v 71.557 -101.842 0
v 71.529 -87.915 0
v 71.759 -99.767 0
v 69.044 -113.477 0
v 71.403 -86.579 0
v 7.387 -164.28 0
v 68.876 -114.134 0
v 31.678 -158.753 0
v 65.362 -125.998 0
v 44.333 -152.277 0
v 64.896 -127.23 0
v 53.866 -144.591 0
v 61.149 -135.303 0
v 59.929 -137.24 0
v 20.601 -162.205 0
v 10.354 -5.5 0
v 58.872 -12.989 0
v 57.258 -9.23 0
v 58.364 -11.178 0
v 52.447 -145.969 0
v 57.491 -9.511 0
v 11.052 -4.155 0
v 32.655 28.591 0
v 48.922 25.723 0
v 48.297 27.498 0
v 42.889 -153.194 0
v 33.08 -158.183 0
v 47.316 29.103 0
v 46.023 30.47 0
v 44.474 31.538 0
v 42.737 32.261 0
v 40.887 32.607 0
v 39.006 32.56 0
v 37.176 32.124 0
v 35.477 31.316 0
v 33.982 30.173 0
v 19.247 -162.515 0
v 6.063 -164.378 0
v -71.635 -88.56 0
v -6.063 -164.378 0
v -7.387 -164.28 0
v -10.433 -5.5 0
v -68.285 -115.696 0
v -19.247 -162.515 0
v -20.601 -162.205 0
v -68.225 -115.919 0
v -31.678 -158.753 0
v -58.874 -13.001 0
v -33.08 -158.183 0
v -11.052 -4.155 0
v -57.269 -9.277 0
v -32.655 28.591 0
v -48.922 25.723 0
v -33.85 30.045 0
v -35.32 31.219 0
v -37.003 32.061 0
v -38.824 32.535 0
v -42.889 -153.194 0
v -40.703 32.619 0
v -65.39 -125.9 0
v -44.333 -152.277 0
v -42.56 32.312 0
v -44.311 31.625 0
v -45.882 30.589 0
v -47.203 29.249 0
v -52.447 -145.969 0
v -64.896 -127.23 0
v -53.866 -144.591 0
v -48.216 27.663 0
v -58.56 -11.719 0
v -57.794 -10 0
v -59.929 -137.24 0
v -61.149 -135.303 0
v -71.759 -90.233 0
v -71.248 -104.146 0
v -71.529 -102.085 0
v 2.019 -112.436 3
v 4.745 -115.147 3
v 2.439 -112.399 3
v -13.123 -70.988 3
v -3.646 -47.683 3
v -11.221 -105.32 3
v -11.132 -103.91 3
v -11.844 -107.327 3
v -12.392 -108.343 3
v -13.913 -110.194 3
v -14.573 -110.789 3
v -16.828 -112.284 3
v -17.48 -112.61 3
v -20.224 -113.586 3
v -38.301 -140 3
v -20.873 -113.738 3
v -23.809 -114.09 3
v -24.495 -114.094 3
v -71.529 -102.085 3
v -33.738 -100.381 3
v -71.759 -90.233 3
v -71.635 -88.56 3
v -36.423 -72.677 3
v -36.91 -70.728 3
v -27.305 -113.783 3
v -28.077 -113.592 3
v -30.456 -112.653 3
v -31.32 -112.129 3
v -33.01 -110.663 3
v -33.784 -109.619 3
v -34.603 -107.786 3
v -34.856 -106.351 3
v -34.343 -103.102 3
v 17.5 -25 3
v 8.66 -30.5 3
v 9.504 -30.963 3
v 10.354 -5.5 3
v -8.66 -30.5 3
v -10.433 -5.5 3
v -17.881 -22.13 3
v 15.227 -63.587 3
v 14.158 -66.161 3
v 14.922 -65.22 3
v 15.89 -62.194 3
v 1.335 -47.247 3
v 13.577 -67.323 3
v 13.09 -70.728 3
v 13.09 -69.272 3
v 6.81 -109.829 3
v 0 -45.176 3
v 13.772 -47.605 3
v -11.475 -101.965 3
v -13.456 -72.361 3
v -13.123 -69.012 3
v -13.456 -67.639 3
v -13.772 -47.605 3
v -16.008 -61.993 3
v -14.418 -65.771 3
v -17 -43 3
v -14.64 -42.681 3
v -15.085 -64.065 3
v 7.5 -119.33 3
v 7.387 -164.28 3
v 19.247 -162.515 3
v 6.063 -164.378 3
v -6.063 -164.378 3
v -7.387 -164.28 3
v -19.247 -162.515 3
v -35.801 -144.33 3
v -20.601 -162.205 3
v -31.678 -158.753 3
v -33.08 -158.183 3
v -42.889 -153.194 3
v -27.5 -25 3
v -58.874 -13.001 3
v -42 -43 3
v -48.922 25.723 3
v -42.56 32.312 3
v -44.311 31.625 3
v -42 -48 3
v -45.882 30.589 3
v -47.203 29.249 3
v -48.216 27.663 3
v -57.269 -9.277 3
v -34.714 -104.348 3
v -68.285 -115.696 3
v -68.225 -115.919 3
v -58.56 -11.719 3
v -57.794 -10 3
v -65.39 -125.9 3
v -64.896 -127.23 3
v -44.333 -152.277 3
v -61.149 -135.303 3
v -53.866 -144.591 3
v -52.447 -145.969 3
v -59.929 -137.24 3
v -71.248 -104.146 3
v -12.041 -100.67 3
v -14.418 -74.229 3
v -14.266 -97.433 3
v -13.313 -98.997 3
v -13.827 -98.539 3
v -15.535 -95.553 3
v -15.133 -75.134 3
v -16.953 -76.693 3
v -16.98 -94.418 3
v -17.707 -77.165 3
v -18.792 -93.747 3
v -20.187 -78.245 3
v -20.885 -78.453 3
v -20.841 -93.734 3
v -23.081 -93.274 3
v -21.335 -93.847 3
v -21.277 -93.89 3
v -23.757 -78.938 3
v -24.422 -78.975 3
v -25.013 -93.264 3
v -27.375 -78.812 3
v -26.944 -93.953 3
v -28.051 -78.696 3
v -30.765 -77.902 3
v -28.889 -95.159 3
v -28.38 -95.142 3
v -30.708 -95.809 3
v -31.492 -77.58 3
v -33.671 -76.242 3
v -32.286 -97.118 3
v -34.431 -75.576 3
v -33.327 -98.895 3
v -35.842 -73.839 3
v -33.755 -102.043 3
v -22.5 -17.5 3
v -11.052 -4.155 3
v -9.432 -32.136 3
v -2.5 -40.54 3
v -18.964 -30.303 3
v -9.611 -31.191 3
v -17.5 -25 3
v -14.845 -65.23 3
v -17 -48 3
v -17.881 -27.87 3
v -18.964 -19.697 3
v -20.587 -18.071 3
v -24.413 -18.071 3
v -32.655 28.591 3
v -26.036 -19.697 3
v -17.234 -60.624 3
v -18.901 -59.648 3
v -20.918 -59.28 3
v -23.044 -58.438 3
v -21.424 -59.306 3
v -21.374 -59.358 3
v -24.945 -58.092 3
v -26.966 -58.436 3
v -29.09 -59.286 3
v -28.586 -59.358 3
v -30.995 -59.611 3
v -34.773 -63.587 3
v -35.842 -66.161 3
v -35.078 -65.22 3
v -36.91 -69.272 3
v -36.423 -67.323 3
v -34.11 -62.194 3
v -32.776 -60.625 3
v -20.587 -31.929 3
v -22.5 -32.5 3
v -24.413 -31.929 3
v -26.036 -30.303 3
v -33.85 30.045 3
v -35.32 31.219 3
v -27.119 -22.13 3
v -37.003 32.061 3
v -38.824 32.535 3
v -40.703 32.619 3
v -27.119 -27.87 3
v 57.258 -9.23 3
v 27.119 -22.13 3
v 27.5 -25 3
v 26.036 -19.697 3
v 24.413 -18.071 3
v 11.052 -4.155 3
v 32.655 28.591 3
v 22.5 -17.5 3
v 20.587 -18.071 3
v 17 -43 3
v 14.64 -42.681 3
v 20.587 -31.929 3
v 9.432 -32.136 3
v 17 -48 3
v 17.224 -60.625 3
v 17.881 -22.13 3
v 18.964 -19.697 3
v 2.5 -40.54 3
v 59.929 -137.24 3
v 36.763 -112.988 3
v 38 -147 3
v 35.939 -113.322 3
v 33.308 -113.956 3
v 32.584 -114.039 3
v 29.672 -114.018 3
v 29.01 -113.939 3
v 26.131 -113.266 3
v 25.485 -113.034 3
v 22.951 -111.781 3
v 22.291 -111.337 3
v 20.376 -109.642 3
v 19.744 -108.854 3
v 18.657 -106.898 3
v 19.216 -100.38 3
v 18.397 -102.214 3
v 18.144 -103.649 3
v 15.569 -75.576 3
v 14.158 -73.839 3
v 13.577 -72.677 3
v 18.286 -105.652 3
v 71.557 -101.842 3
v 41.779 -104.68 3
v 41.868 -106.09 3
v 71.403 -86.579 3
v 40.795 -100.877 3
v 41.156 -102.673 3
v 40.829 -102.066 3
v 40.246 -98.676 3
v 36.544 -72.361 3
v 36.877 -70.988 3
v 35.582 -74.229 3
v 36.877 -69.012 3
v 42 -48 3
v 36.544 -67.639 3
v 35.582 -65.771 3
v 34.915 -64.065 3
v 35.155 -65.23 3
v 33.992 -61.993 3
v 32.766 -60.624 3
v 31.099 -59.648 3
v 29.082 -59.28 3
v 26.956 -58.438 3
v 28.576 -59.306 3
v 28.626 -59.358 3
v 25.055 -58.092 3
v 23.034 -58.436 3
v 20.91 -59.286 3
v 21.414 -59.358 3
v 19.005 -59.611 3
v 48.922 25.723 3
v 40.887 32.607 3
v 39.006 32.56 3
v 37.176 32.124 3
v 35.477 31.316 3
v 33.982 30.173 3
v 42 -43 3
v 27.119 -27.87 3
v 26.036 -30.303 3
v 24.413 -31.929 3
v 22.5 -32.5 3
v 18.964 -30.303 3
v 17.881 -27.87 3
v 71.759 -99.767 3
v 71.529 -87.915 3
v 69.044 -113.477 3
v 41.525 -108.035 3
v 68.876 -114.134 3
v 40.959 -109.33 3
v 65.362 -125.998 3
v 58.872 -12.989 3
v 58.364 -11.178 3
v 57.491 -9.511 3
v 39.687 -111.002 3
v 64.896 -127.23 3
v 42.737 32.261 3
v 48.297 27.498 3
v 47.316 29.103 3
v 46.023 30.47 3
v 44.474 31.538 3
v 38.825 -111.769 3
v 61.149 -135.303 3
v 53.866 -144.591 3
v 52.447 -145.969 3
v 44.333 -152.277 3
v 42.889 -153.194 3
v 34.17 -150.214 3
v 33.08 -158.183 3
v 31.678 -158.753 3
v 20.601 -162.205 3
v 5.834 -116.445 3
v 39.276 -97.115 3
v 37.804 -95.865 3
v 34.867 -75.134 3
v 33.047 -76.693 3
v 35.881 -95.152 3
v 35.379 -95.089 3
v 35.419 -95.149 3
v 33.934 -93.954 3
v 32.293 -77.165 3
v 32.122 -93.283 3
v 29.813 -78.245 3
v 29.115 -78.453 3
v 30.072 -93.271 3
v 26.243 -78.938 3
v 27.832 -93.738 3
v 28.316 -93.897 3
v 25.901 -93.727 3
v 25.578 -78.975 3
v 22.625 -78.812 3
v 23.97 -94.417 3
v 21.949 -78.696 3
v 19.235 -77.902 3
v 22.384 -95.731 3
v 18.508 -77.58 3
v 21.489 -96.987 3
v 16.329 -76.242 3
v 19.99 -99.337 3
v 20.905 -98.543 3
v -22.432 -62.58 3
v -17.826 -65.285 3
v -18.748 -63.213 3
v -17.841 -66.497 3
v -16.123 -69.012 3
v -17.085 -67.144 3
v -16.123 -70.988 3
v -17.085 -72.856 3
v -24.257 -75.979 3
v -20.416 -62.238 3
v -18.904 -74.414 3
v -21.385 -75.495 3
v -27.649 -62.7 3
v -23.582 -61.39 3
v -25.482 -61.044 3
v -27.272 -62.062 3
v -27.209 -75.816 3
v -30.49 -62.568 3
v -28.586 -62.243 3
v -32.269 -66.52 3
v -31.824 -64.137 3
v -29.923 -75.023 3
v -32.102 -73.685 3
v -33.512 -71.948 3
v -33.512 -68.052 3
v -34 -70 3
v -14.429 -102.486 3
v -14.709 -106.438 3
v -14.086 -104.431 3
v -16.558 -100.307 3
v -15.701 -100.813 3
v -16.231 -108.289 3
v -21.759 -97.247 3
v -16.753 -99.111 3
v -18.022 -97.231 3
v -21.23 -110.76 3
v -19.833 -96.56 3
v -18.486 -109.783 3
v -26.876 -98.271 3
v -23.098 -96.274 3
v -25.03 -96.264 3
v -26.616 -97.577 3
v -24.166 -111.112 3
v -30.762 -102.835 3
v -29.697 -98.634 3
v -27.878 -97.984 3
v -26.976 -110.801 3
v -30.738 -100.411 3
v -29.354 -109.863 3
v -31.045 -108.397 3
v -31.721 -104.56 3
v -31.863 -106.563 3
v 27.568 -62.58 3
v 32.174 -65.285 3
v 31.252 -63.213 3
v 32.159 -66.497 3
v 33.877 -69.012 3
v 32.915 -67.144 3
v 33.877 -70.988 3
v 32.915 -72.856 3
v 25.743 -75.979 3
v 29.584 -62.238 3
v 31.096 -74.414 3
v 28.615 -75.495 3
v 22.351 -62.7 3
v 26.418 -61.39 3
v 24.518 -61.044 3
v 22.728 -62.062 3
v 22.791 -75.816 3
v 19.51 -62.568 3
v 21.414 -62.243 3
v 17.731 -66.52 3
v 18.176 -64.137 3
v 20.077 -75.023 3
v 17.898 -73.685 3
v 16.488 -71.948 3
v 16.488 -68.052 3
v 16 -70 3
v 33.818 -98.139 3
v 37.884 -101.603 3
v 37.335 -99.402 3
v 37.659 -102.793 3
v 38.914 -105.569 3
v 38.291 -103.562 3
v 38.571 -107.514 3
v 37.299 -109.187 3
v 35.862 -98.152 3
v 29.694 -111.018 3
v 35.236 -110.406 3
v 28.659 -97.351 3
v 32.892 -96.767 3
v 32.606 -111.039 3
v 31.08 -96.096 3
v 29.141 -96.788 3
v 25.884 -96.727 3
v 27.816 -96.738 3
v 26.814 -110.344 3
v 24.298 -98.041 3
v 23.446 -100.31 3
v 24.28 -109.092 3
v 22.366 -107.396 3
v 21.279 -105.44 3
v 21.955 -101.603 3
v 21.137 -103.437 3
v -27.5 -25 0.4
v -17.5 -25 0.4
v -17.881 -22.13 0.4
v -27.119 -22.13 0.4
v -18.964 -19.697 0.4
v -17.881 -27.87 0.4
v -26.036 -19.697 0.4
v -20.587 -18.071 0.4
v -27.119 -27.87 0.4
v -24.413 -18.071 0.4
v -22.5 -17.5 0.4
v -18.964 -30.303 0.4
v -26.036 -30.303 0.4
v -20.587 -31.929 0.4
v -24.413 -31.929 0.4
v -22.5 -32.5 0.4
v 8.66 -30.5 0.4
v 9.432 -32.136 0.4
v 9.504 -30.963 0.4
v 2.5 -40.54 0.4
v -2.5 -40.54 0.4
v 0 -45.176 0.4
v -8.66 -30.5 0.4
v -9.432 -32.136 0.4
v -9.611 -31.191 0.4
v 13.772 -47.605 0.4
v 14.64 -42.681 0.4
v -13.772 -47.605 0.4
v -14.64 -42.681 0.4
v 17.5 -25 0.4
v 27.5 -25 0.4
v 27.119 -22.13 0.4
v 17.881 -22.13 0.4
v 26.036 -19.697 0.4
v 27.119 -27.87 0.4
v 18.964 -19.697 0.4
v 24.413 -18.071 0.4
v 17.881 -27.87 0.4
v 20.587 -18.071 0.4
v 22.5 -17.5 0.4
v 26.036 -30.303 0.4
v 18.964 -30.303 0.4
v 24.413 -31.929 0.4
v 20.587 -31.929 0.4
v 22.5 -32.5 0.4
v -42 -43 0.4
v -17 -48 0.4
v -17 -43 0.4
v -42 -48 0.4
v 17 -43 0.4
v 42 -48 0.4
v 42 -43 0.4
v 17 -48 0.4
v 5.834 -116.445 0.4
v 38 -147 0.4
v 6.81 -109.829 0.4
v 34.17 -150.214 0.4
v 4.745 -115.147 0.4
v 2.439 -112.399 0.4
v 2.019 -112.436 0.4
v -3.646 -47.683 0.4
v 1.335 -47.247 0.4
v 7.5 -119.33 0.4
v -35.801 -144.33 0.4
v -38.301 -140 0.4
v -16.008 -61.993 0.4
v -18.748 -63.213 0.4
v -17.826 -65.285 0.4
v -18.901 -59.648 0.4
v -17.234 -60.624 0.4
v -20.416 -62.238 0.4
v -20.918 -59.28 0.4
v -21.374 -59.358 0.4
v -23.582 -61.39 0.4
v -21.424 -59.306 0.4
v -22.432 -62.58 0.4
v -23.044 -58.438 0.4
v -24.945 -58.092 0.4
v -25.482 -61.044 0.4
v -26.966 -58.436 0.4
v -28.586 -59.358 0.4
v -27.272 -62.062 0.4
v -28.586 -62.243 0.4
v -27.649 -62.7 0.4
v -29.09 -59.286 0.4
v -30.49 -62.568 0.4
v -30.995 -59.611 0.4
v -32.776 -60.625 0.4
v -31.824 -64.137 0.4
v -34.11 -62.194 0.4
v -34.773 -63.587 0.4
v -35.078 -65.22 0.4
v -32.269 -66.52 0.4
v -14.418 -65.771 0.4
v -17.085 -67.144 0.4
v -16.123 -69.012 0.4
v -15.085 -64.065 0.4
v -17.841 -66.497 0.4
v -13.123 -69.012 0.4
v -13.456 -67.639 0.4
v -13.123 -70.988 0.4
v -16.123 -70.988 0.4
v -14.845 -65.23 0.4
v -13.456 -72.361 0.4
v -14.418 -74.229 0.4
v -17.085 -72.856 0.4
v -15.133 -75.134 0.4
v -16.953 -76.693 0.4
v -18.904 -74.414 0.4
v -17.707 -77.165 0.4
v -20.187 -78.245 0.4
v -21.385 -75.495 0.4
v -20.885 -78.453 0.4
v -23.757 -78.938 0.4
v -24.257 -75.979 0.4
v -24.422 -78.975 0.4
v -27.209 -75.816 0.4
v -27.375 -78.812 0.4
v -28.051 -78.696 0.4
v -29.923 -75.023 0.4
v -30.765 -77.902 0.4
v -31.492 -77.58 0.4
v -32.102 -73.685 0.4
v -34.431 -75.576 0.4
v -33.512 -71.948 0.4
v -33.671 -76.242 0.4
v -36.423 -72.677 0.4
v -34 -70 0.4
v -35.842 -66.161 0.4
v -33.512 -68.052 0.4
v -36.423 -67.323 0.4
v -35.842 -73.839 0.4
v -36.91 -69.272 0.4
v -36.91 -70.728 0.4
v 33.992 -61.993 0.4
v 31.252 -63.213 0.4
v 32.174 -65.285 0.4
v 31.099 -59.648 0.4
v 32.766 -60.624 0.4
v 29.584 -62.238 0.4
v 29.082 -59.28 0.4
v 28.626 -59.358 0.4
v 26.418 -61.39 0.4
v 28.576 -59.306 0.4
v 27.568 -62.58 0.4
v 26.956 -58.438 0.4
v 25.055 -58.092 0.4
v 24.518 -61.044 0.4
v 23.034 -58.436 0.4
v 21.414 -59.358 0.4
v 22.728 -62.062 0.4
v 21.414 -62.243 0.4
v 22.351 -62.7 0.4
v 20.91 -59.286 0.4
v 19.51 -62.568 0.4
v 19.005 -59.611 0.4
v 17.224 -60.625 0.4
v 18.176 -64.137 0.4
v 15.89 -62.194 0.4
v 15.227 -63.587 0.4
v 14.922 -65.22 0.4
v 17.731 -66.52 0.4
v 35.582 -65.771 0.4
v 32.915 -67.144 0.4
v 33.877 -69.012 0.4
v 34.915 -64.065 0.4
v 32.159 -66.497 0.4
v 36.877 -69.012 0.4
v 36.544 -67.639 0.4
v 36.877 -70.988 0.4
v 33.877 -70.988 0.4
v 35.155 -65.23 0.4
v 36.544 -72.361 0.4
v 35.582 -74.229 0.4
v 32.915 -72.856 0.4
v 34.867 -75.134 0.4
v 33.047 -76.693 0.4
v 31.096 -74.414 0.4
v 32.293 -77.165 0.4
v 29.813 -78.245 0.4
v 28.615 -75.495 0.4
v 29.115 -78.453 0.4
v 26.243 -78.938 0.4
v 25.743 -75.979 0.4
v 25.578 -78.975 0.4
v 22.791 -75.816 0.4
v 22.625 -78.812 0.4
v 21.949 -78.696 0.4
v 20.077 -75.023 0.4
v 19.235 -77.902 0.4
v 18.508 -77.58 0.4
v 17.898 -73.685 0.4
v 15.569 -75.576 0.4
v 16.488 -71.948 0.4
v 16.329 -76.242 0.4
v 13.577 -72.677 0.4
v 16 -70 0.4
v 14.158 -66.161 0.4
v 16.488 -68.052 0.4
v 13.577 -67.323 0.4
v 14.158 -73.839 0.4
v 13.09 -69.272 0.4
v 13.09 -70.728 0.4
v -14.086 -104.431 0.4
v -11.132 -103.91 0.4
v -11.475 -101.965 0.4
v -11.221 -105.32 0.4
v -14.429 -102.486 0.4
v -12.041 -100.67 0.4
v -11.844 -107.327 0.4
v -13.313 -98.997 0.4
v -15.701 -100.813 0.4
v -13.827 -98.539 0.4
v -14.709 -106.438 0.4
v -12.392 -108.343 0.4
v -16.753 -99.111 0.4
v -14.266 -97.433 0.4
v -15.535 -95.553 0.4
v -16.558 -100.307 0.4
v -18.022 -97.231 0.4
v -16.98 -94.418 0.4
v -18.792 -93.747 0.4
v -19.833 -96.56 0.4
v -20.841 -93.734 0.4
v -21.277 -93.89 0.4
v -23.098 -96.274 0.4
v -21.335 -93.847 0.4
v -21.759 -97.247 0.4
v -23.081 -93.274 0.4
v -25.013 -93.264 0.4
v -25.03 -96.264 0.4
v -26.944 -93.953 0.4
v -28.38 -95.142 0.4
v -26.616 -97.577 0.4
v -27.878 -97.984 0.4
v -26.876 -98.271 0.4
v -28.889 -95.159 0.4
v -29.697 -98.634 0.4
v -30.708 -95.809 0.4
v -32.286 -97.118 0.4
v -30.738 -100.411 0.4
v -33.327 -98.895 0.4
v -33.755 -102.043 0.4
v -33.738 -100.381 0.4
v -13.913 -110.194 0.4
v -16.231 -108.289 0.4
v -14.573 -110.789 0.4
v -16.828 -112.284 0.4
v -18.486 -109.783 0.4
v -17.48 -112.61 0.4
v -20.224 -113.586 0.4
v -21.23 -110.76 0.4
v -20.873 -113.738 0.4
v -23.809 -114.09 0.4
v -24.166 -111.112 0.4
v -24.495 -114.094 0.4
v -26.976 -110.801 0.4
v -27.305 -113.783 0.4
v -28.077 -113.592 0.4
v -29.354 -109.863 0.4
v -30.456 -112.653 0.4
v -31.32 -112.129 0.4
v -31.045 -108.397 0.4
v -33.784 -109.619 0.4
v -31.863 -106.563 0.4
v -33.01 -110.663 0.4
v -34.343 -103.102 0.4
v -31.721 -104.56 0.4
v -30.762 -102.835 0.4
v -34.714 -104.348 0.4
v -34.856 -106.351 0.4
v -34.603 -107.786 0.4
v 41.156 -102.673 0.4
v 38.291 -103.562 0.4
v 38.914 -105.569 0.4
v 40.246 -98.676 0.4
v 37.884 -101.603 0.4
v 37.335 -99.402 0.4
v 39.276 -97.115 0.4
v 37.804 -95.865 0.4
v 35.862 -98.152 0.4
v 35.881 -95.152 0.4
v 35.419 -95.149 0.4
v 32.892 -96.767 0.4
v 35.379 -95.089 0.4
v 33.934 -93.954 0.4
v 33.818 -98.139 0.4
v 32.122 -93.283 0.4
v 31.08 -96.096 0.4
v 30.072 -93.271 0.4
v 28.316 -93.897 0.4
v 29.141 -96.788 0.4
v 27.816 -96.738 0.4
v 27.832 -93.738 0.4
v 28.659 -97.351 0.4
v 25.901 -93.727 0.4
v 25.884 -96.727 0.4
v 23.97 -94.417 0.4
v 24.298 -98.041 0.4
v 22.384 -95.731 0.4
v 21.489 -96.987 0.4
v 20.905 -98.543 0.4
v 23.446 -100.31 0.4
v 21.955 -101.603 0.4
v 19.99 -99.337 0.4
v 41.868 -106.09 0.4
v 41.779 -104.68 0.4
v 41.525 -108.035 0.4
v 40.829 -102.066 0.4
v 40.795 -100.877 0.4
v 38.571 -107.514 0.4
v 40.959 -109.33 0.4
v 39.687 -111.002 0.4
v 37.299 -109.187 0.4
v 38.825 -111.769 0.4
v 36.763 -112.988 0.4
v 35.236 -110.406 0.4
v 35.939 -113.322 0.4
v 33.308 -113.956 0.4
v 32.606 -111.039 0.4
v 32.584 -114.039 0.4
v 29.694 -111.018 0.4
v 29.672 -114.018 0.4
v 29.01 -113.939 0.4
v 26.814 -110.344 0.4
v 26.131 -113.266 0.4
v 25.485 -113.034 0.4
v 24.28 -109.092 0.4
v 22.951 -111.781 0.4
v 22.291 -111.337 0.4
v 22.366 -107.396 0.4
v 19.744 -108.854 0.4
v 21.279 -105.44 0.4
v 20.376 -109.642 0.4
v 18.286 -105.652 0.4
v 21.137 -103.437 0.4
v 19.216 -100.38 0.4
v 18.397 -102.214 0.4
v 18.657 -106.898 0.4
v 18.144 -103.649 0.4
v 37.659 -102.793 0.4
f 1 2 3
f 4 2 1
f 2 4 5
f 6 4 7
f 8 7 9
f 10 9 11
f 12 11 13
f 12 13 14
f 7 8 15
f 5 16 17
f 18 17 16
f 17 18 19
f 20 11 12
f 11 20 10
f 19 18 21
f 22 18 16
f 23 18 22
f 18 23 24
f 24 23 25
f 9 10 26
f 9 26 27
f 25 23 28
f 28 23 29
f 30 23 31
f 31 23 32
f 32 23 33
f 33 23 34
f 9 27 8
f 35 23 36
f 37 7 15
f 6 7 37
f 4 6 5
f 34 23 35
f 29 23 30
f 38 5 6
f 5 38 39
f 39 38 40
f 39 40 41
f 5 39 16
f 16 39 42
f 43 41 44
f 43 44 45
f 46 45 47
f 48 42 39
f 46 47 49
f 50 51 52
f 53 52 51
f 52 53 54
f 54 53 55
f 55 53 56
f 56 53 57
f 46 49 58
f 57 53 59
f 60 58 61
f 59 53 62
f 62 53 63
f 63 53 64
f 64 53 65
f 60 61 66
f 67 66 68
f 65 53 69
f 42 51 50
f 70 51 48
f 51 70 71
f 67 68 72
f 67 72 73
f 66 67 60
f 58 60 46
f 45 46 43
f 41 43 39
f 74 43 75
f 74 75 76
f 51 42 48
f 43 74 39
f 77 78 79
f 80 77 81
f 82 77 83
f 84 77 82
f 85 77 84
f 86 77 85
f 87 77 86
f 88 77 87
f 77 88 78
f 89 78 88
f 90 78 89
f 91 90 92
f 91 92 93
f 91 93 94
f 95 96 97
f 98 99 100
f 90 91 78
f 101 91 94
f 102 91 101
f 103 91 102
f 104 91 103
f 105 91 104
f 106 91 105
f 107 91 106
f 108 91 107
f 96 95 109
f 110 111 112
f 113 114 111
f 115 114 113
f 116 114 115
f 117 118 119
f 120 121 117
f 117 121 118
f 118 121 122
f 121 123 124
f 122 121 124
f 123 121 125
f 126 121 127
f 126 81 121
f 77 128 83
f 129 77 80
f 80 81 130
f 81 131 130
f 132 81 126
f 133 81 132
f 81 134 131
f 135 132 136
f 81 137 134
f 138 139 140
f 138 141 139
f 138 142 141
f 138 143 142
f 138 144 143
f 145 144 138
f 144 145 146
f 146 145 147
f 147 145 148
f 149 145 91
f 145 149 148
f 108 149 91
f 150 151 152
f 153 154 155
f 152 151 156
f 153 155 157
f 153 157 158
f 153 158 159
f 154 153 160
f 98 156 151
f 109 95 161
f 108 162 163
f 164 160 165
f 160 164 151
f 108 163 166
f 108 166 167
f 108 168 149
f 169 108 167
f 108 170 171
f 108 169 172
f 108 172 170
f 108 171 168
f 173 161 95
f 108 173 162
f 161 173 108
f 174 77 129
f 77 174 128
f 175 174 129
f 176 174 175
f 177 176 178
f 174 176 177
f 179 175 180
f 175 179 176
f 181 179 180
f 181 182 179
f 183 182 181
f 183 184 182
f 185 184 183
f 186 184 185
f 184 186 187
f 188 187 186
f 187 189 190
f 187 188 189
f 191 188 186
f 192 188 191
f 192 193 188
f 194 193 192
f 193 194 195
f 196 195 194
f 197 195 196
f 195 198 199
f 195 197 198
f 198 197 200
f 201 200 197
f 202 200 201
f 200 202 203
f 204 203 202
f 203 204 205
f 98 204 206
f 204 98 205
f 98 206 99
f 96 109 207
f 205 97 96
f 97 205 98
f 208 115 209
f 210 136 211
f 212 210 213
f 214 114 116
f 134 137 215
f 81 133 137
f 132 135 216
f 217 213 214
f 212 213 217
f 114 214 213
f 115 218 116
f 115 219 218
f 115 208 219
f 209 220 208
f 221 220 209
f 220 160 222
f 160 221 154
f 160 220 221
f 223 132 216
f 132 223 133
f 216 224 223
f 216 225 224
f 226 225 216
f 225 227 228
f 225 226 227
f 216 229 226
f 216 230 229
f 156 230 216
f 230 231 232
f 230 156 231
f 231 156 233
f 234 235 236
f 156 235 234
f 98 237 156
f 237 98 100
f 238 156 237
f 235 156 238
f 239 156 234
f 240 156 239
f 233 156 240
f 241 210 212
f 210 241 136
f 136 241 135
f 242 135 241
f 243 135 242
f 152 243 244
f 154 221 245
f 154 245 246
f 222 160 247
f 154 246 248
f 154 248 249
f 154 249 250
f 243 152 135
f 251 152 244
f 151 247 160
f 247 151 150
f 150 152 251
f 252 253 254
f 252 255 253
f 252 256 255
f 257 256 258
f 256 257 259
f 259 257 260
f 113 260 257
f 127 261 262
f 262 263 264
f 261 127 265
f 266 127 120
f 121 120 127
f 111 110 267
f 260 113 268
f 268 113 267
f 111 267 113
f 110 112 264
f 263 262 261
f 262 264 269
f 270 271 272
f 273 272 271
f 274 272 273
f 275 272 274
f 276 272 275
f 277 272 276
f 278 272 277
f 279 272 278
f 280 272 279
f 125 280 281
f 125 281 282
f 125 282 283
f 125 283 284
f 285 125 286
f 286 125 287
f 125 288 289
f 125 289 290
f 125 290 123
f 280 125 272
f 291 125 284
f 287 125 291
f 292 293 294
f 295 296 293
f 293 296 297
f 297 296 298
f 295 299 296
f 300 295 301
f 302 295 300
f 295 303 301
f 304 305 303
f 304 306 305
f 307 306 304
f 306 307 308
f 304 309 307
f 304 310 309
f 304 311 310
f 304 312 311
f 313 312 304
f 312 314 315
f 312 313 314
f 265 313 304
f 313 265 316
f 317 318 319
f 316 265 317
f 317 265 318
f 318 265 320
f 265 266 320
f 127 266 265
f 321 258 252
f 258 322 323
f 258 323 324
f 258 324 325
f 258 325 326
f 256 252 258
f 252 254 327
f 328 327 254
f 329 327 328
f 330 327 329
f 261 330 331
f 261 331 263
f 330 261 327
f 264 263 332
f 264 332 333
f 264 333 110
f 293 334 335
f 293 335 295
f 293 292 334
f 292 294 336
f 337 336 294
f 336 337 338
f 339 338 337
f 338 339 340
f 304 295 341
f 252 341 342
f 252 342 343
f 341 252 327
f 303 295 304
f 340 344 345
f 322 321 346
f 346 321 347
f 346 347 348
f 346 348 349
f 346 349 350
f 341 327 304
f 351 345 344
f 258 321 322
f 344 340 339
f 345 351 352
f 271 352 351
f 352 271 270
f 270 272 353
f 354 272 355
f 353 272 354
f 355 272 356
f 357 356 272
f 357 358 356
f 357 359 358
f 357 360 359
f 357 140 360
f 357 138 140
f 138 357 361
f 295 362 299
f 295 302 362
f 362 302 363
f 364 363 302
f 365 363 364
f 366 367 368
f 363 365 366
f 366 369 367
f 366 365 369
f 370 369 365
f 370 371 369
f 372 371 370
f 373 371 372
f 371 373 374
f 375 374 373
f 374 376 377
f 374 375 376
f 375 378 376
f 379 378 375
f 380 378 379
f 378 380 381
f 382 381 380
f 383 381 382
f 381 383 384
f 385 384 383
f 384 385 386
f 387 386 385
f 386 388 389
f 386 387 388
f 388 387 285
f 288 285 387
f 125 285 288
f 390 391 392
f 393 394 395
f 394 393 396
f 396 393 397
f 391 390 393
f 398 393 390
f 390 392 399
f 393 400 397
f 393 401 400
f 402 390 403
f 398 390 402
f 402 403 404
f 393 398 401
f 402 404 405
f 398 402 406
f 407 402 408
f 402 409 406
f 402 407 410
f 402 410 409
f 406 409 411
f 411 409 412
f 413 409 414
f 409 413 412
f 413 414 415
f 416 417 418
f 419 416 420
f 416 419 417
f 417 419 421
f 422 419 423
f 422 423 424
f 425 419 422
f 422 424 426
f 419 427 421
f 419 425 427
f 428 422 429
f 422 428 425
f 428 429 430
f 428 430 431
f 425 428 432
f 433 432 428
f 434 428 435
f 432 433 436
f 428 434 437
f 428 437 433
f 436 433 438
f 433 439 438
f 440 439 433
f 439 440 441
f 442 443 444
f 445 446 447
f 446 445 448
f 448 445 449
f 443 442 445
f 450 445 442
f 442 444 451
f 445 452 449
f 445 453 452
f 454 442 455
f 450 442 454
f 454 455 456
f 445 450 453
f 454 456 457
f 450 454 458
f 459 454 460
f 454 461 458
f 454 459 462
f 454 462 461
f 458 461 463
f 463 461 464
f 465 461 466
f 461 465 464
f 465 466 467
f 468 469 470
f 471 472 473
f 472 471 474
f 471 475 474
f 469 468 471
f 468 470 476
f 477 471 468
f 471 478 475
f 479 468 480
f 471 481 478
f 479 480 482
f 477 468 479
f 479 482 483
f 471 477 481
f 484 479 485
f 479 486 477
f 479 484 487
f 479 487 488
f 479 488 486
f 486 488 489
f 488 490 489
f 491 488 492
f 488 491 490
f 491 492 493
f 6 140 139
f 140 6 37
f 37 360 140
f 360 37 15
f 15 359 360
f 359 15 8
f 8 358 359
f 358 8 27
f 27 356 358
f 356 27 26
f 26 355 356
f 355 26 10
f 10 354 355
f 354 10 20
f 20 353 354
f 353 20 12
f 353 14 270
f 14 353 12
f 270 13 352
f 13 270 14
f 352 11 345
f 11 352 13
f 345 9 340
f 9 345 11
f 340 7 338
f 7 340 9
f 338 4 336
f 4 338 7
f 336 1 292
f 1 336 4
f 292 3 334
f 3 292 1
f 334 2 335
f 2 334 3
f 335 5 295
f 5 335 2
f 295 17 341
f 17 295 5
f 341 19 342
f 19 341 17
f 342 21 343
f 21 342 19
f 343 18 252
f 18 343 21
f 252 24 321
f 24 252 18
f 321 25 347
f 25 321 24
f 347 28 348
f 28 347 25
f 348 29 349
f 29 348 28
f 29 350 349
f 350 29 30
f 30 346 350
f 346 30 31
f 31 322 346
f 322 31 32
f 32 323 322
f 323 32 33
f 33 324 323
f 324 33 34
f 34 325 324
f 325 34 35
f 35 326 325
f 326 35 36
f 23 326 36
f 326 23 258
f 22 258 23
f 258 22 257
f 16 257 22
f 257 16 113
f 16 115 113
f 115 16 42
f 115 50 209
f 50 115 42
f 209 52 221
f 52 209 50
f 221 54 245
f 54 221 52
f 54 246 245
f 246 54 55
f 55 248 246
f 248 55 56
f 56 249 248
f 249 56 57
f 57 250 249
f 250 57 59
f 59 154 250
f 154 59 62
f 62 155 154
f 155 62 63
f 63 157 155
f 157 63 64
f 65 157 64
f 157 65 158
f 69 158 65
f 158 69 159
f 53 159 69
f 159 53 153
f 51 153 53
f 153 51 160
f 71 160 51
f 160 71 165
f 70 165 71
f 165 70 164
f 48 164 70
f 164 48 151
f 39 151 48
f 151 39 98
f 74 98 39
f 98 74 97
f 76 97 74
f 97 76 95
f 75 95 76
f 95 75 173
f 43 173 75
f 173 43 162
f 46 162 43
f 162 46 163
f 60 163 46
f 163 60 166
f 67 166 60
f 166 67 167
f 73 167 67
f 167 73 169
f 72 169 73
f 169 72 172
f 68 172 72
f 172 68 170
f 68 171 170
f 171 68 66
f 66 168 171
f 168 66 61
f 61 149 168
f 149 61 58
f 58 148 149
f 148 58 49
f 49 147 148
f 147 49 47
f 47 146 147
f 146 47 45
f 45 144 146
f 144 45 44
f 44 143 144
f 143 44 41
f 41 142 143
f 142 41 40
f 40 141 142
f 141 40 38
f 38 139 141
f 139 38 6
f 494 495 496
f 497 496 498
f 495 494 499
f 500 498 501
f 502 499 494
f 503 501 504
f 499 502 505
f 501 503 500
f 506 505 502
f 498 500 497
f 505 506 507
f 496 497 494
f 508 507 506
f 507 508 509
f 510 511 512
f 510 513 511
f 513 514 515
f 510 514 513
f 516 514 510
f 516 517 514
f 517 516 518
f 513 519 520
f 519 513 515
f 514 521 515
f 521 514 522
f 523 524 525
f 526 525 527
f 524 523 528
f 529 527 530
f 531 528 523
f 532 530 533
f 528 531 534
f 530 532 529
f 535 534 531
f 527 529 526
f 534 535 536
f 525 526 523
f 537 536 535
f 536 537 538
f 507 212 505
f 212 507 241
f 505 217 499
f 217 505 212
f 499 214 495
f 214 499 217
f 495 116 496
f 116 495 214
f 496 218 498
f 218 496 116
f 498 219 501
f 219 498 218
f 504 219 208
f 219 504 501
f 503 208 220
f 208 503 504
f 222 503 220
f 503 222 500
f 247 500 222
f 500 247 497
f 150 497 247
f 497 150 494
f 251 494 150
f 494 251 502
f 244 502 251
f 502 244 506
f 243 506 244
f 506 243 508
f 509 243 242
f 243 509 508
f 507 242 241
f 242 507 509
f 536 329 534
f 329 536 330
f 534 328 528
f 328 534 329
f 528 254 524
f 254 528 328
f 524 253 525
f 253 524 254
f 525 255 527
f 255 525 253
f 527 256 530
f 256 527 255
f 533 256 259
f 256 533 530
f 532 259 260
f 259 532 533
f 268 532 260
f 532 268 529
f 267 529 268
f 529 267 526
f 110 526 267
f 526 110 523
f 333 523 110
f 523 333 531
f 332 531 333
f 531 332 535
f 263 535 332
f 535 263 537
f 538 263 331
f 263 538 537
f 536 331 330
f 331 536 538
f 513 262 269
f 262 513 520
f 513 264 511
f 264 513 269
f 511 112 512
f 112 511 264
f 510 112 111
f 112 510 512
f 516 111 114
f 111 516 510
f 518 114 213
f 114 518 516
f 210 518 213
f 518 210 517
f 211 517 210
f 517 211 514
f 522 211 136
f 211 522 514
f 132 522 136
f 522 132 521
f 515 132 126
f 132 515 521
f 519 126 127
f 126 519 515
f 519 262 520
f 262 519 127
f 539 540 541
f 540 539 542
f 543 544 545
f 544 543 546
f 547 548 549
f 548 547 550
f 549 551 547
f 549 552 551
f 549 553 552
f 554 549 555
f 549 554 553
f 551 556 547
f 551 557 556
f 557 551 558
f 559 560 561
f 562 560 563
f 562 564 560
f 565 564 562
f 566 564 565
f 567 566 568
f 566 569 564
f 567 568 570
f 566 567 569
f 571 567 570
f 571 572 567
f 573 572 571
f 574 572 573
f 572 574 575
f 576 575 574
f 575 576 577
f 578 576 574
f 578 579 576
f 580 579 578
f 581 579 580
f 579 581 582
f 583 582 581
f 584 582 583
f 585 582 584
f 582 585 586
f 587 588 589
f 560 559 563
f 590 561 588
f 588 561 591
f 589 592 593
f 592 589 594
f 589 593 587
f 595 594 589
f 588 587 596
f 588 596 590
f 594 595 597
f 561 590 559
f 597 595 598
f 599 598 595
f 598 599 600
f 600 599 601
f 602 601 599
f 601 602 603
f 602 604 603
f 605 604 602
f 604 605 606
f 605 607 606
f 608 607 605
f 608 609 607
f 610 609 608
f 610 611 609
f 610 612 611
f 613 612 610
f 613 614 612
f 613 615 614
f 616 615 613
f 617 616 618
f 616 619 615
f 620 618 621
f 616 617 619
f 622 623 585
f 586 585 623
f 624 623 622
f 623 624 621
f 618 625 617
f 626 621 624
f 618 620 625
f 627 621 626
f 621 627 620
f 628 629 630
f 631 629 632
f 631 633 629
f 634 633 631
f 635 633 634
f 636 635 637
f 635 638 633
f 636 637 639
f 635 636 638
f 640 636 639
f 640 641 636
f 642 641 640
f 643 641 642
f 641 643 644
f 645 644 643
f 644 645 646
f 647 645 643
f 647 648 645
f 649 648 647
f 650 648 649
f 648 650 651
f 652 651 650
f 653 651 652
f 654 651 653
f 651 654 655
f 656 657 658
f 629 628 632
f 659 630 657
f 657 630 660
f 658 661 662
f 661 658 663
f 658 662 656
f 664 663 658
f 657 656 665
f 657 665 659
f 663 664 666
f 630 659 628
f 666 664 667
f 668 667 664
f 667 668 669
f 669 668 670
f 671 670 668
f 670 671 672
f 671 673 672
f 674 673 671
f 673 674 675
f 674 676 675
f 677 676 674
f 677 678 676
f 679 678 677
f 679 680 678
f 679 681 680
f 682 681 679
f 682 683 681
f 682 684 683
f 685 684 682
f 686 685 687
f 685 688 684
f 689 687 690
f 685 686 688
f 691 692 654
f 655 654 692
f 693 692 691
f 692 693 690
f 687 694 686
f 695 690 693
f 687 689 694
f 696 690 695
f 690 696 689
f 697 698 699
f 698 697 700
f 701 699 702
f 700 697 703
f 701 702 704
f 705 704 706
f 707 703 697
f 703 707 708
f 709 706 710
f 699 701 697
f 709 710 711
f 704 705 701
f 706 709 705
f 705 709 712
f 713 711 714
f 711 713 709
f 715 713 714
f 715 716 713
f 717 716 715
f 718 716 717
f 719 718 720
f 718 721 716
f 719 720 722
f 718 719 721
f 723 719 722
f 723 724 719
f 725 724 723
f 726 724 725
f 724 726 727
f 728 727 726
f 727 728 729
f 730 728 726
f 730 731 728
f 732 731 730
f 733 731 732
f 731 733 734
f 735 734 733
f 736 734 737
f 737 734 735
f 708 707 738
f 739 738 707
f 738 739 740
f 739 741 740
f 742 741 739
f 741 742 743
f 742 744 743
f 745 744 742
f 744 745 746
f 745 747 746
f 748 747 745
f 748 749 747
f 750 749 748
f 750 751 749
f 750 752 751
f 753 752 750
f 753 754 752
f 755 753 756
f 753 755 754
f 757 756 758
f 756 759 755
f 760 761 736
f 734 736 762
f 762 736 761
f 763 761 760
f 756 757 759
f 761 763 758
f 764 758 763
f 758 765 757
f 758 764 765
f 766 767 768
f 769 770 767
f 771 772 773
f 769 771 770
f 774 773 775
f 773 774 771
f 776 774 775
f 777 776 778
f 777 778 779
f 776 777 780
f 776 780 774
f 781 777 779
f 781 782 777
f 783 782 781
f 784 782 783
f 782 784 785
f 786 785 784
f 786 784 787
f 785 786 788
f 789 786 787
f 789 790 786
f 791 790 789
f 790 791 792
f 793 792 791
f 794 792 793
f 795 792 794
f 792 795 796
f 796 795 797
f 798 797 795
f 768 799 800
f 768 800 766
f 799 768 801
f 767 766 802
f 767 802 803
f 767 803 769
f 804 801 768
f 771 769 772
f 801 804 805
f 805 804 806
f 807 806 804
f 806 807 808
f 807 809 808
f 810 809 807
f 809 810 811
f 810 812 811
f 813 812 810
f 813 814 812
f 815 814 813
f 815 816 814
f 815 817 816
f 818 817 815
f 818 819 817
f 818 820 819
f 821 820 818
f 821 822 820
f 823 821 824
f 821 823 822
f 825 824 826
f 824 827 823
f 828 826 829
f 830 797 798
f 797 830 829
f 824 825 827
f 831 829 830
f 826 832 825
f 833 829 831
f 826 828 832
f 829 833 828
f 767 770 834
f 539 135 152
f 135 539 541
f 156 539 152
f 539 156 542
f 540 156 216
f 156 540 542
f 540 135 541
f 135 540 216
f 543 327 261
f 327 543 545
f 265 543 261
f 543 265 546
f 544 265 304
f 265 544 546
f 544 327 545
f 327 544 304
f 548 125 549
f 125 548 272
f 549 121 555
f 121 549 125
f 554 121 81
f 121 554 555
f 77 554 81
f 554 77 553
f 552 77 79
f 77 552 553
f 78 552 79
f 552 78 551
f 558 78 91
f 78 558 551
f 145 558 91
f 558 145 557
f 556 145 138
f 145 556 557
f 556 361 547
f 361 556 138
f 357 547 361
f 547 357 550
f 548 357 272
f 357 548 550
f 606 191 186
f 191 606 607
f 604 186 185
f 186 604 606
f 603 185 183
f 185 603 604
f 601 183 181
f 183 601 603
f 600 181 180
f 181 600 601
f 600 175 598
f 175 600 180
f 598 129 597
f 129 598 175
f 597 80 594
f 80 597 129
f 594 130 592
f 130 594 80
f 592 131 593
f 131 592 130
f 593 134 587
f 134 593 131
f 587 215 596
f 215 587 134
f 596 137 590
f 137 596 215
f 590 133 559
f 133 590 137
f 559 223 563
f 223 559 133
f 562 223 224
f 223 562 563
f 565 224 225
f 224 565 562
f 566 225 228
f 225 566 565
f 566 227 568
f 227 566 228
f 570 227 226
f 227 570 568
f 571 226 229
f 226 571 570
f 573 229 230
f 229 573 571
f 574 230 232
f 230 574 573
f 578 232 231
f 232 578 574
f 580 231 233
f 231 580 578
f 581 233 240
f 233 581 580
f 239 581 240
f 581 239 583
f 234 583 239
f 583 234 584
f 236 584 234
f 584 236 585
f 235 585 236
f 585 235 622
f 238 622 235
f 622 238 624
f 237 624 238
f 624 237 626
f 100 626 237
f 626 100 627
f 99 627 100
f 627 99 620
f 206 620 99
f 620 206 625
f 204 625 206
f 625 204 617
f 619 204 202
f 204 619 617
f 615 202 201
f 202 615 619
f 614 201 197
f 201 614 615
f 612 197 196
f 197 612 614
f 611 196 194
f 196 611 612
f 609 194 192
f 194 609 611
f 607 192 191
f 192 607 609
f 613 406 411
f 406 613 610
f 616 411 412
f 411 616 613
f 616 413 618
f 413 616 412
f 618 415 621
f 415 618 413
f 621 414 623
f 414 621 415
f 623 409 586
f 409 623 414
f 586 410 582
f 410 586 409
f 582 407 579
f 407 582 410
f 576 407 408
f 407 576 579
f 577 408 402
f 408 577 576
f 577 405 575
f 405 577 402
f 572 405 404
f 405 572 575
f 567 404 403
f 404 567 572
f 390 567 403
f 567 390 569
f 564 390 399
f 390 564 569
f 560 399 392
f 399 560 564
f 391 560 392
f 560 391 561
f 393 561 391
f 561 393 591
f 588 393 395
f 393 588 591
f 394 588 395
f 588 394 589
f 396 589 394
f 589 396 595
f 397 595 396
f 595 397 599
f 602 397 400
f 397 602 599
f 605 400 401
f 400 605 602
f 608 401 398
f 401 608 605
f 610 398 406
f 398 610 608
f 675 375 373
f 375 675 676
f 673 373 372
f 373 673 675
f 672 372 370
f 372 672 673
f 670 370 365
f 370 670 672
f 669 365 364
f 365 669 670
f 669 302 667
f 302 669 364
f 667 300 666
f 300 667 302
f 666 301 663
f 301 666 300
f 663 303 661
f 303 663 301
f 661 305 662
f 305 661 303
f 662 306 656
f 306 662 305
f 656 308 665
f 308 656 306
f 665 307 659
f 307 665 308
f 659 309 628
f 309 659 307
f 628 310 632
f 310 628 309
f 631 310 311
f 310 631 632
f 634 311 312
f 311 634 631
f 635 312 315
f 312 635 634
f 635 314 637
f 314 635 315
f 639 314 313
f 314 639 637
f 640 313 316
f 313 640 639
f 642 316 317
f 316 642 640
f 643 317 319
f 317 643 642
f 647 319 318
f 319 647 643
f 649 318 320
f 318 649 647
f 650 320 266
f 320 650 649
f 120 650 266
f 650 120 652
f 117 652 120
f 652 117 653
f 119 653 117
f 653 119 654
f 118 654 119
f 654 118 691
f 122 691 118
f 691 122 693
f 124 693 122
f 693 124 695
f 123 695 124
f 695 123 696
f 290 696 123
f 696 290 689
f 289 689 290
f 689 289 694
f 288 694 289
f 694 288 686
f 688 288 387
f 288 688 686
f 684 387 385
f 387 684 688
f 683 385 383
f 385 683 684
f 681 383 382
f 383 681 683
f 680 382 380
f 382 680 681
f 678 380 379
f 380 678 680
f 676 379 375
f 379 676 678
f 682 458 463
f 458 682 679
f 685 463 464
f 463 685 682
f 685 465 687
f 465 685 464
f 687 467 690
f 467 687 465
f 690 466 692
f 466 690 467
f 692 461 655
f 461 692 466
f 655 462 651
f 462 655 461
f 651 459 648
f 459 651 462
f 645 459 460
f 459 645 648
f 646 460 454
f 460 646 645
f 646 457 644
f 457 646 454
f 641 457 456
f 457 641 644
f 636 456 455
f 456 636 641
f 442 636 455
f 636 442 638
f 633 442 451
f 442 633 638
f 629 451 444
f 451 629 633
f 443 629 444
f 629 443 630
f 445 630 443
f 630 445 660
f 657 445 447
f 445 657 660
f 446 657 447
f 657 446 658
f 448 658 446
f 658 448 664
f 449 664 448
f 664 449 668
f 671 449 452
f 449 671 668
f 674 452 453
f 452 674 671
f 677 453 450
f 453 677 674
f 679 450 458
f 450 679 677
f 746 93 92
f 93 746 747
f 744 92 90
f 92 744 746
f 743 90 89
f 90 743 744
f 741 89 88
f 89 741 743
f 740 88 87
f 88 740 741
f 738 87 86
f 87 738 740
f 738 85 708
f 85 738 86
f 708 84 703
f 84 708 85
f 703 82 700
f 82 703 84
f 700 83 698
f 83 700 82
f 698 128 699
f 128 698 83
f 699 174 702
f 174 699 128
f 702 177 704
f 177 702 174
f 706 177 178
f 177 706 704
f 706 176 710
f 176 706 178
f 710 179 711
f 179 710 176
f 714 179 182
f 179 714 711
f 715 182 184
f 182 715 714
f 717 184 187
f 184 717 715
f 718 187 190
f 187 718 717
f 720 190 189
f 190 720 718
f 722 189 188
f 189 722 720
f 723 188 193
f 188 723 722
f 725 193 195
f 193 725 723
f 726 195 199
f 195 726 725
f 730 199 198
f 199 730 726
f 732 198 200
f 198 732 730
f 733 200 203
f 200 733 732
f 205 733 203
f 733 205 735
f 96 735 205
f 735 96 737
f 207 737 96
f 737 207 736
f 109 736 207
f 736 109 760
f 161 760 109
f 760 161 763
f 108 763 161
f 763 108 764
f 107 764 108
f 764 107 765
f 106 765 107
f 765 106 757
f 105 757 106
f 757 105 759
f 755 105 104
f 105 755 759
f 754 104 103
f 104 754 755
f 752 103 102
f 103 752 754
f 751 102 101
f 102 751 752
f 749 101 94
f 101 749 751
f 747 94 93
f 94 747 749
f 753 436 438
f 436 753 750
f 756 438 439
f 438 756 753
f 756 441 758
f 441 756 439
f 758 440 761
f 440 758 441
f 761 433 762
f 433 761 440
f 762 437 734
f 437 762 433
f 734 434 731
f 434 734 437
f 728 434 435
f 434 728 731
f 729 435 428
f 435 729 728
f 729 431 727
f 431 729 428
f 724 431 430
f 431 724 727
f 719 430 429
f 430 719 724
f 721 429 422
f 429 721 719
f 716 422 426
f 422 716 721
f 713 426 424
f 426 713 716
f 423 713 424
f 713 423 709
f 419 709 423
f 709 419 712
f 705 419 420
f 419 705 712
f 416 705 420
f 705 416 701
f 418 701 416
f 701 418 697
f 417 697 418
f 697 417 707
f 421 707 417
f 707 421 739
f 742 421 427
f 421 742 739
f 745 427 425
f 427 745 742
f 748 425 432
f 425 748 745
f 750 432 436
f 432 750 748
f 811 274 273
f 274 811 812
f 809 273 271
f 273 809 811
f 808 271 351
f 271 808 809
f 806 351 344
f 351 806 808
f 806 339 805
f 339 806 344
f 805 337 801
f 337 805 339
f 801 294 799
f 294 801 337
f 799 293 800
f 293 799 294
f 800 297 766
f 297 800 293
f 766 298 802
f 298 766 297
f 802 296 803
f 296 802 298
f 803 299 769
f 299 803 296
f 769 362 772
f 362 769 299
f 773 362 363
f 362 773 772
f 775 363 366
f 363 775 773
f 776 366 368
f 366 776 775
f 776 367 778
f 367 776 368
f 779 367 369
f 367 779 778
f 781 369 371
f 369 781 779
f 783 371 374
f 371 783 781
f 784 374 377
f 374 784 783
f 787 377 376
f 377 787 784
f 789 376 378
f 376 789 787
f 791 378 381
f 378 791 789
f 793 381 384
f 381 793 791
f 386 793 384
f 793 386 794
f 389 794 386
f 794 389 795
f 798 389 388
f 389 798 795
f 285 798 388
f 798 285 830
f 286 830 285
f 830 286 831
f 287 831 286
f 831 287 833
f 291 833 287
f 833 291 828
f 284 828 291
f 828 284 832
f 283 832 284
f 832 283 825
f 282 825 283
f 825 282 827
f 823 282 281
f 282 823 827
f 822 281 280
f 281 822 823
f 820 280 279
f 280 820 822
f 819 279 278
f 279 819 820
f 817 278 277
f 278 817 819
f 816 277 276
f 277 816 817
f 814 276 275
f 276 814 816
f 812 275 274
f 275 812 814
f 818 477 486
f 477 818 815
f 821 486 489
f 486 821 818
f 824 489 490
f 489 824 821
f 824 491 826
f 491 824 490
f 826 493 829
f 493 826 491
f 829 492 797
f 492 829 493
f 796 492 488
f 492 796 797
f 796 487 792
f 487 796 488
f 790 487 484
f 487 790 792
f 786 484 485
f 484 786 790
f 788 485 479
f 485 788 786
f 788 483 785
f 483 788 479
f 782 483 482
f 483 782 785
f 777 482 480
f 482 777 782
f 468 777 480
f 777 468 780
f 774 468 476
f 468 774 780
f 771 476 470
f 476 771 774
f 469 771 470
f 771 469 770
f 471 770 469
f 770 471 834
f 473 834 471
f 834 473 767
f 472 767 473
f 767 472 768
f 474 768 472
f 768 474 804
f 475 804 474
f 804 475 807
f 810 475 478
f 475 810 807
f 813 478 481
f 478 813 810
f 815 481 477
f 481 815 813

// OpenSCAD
ear_offset = 72;
ear_rotation = 10;

eye_offset = 45;

track_width = 5;

thickness = 3;
light_screen_thickness = 0.4;


difference(){
linear_extrude(thickness)
offset(9, $fn=30)
cat_base();

#translate([0,0,light_screen_thickness])
linear_extrude(thickness*2)
    translate([0,-25,0])
    cat_face();
    
translate([0,0,light_screen_thickness])    
linear_extrude(thickness*2)
mirror([1,0,0]){

    paw_set();


    
    sou_parts();
};
}

module paw_set(){
    translate([-25,-70,0])
    difference(){
    offset(3)
    cat_paw();
    cat_paw();
    }
    
    translate([25,-70,0])
    difference(){
    offset(3)
    cat_paw();
    cat_paw();
    }
    
    
    translate([-25-5,-105,0])
    rotate([0,0,10])
    difference(){
    offset(3)
    cat_paw();
    cat_paw();
    }
    
    translate([25-2,-105,0])
    rotate([0,0,-10])
    difference(){
    offset(3)
    cat_paw();
    cat_paw();
    }

}


module sou_parts(){
    
    
    translate([17,-48,0])
    square([25,track_width]);
    
    translate([-22-20,-48,0])
    square([25,track_width]);
    
    
    translate([-7,-112,0])
    rotate([0,0,-5])
    square([track_width,65]);
    
    translate([-38,-147,0])
    rotate([0,0,-40])
    square([track_width,50]);
    
    
    translate([-5,-115,0])
    rotate([0,0,-120])
    square([track_width,50]);
    
    
    
    
    
}


module cat_paw(){
    scale([1.5,1,1])
    circle(6);
   
    translate([0,3,0])
    scale([1,1.5,1])
    circle(4);
    
    translate([-3,2,0])
    rotate([0,0,20])
    scale([1,1.5,1])
    circle(4);
    
    translate([3,2,0])
    rotate([0,0,-20])
    scale([1,1.5,1])
    circle(4);
}

module cat_face(){
    translate([-eye_offset/2,0,0])
    scale([1,1.5,1])
    circle(5);
    
    translate([eye_offset/2,0,0])
    scale([1,1.5,1])
    circle(5);
    
    offset(1)
    translate([0,-10,0])
    scale([1,0.7,1])
    rotate([0,0,-30+180])
    circle(10, $fn=3);
    
    translate([-1,-20,0])
    rotate([0,0,-10])
    square([15,track_width]);

    translate([1,-20,0])
    rotate([0,0,10])
    translate([-15,0,0])
    square([15,track_width]);

}

module cat_base(){

translate([-ear_offset/2,0,0])
rotate([0,0,ear_rotation])
scale([0.9,1.2,1])
rotate([0,0,-30])
circle(20, $fn=3);

translate([ear_offset/2,0,0])
rotate([0,0,-ear_rotation])
scale([0.9,1.2,1])
rotate([0,0,-30])
circle(20, $fn=3);

hull(){
    translate([-50,-24.5,0])
    square([100,10]);

    translate([0,-95,0])
    scale([1,0.9,1])
    rotate([0,0,-5])
    circle(63);
    
    translate([0,-115,0])
    scale([1,0.7,1])
    circle(58);
}

/*
translate([5,-180,0])
scale([1,0.7,1])
difference(){
    circle(51);
    circle(50);
    
    rotate([0,0,110])
    square([100,100]);
}
*/
}
